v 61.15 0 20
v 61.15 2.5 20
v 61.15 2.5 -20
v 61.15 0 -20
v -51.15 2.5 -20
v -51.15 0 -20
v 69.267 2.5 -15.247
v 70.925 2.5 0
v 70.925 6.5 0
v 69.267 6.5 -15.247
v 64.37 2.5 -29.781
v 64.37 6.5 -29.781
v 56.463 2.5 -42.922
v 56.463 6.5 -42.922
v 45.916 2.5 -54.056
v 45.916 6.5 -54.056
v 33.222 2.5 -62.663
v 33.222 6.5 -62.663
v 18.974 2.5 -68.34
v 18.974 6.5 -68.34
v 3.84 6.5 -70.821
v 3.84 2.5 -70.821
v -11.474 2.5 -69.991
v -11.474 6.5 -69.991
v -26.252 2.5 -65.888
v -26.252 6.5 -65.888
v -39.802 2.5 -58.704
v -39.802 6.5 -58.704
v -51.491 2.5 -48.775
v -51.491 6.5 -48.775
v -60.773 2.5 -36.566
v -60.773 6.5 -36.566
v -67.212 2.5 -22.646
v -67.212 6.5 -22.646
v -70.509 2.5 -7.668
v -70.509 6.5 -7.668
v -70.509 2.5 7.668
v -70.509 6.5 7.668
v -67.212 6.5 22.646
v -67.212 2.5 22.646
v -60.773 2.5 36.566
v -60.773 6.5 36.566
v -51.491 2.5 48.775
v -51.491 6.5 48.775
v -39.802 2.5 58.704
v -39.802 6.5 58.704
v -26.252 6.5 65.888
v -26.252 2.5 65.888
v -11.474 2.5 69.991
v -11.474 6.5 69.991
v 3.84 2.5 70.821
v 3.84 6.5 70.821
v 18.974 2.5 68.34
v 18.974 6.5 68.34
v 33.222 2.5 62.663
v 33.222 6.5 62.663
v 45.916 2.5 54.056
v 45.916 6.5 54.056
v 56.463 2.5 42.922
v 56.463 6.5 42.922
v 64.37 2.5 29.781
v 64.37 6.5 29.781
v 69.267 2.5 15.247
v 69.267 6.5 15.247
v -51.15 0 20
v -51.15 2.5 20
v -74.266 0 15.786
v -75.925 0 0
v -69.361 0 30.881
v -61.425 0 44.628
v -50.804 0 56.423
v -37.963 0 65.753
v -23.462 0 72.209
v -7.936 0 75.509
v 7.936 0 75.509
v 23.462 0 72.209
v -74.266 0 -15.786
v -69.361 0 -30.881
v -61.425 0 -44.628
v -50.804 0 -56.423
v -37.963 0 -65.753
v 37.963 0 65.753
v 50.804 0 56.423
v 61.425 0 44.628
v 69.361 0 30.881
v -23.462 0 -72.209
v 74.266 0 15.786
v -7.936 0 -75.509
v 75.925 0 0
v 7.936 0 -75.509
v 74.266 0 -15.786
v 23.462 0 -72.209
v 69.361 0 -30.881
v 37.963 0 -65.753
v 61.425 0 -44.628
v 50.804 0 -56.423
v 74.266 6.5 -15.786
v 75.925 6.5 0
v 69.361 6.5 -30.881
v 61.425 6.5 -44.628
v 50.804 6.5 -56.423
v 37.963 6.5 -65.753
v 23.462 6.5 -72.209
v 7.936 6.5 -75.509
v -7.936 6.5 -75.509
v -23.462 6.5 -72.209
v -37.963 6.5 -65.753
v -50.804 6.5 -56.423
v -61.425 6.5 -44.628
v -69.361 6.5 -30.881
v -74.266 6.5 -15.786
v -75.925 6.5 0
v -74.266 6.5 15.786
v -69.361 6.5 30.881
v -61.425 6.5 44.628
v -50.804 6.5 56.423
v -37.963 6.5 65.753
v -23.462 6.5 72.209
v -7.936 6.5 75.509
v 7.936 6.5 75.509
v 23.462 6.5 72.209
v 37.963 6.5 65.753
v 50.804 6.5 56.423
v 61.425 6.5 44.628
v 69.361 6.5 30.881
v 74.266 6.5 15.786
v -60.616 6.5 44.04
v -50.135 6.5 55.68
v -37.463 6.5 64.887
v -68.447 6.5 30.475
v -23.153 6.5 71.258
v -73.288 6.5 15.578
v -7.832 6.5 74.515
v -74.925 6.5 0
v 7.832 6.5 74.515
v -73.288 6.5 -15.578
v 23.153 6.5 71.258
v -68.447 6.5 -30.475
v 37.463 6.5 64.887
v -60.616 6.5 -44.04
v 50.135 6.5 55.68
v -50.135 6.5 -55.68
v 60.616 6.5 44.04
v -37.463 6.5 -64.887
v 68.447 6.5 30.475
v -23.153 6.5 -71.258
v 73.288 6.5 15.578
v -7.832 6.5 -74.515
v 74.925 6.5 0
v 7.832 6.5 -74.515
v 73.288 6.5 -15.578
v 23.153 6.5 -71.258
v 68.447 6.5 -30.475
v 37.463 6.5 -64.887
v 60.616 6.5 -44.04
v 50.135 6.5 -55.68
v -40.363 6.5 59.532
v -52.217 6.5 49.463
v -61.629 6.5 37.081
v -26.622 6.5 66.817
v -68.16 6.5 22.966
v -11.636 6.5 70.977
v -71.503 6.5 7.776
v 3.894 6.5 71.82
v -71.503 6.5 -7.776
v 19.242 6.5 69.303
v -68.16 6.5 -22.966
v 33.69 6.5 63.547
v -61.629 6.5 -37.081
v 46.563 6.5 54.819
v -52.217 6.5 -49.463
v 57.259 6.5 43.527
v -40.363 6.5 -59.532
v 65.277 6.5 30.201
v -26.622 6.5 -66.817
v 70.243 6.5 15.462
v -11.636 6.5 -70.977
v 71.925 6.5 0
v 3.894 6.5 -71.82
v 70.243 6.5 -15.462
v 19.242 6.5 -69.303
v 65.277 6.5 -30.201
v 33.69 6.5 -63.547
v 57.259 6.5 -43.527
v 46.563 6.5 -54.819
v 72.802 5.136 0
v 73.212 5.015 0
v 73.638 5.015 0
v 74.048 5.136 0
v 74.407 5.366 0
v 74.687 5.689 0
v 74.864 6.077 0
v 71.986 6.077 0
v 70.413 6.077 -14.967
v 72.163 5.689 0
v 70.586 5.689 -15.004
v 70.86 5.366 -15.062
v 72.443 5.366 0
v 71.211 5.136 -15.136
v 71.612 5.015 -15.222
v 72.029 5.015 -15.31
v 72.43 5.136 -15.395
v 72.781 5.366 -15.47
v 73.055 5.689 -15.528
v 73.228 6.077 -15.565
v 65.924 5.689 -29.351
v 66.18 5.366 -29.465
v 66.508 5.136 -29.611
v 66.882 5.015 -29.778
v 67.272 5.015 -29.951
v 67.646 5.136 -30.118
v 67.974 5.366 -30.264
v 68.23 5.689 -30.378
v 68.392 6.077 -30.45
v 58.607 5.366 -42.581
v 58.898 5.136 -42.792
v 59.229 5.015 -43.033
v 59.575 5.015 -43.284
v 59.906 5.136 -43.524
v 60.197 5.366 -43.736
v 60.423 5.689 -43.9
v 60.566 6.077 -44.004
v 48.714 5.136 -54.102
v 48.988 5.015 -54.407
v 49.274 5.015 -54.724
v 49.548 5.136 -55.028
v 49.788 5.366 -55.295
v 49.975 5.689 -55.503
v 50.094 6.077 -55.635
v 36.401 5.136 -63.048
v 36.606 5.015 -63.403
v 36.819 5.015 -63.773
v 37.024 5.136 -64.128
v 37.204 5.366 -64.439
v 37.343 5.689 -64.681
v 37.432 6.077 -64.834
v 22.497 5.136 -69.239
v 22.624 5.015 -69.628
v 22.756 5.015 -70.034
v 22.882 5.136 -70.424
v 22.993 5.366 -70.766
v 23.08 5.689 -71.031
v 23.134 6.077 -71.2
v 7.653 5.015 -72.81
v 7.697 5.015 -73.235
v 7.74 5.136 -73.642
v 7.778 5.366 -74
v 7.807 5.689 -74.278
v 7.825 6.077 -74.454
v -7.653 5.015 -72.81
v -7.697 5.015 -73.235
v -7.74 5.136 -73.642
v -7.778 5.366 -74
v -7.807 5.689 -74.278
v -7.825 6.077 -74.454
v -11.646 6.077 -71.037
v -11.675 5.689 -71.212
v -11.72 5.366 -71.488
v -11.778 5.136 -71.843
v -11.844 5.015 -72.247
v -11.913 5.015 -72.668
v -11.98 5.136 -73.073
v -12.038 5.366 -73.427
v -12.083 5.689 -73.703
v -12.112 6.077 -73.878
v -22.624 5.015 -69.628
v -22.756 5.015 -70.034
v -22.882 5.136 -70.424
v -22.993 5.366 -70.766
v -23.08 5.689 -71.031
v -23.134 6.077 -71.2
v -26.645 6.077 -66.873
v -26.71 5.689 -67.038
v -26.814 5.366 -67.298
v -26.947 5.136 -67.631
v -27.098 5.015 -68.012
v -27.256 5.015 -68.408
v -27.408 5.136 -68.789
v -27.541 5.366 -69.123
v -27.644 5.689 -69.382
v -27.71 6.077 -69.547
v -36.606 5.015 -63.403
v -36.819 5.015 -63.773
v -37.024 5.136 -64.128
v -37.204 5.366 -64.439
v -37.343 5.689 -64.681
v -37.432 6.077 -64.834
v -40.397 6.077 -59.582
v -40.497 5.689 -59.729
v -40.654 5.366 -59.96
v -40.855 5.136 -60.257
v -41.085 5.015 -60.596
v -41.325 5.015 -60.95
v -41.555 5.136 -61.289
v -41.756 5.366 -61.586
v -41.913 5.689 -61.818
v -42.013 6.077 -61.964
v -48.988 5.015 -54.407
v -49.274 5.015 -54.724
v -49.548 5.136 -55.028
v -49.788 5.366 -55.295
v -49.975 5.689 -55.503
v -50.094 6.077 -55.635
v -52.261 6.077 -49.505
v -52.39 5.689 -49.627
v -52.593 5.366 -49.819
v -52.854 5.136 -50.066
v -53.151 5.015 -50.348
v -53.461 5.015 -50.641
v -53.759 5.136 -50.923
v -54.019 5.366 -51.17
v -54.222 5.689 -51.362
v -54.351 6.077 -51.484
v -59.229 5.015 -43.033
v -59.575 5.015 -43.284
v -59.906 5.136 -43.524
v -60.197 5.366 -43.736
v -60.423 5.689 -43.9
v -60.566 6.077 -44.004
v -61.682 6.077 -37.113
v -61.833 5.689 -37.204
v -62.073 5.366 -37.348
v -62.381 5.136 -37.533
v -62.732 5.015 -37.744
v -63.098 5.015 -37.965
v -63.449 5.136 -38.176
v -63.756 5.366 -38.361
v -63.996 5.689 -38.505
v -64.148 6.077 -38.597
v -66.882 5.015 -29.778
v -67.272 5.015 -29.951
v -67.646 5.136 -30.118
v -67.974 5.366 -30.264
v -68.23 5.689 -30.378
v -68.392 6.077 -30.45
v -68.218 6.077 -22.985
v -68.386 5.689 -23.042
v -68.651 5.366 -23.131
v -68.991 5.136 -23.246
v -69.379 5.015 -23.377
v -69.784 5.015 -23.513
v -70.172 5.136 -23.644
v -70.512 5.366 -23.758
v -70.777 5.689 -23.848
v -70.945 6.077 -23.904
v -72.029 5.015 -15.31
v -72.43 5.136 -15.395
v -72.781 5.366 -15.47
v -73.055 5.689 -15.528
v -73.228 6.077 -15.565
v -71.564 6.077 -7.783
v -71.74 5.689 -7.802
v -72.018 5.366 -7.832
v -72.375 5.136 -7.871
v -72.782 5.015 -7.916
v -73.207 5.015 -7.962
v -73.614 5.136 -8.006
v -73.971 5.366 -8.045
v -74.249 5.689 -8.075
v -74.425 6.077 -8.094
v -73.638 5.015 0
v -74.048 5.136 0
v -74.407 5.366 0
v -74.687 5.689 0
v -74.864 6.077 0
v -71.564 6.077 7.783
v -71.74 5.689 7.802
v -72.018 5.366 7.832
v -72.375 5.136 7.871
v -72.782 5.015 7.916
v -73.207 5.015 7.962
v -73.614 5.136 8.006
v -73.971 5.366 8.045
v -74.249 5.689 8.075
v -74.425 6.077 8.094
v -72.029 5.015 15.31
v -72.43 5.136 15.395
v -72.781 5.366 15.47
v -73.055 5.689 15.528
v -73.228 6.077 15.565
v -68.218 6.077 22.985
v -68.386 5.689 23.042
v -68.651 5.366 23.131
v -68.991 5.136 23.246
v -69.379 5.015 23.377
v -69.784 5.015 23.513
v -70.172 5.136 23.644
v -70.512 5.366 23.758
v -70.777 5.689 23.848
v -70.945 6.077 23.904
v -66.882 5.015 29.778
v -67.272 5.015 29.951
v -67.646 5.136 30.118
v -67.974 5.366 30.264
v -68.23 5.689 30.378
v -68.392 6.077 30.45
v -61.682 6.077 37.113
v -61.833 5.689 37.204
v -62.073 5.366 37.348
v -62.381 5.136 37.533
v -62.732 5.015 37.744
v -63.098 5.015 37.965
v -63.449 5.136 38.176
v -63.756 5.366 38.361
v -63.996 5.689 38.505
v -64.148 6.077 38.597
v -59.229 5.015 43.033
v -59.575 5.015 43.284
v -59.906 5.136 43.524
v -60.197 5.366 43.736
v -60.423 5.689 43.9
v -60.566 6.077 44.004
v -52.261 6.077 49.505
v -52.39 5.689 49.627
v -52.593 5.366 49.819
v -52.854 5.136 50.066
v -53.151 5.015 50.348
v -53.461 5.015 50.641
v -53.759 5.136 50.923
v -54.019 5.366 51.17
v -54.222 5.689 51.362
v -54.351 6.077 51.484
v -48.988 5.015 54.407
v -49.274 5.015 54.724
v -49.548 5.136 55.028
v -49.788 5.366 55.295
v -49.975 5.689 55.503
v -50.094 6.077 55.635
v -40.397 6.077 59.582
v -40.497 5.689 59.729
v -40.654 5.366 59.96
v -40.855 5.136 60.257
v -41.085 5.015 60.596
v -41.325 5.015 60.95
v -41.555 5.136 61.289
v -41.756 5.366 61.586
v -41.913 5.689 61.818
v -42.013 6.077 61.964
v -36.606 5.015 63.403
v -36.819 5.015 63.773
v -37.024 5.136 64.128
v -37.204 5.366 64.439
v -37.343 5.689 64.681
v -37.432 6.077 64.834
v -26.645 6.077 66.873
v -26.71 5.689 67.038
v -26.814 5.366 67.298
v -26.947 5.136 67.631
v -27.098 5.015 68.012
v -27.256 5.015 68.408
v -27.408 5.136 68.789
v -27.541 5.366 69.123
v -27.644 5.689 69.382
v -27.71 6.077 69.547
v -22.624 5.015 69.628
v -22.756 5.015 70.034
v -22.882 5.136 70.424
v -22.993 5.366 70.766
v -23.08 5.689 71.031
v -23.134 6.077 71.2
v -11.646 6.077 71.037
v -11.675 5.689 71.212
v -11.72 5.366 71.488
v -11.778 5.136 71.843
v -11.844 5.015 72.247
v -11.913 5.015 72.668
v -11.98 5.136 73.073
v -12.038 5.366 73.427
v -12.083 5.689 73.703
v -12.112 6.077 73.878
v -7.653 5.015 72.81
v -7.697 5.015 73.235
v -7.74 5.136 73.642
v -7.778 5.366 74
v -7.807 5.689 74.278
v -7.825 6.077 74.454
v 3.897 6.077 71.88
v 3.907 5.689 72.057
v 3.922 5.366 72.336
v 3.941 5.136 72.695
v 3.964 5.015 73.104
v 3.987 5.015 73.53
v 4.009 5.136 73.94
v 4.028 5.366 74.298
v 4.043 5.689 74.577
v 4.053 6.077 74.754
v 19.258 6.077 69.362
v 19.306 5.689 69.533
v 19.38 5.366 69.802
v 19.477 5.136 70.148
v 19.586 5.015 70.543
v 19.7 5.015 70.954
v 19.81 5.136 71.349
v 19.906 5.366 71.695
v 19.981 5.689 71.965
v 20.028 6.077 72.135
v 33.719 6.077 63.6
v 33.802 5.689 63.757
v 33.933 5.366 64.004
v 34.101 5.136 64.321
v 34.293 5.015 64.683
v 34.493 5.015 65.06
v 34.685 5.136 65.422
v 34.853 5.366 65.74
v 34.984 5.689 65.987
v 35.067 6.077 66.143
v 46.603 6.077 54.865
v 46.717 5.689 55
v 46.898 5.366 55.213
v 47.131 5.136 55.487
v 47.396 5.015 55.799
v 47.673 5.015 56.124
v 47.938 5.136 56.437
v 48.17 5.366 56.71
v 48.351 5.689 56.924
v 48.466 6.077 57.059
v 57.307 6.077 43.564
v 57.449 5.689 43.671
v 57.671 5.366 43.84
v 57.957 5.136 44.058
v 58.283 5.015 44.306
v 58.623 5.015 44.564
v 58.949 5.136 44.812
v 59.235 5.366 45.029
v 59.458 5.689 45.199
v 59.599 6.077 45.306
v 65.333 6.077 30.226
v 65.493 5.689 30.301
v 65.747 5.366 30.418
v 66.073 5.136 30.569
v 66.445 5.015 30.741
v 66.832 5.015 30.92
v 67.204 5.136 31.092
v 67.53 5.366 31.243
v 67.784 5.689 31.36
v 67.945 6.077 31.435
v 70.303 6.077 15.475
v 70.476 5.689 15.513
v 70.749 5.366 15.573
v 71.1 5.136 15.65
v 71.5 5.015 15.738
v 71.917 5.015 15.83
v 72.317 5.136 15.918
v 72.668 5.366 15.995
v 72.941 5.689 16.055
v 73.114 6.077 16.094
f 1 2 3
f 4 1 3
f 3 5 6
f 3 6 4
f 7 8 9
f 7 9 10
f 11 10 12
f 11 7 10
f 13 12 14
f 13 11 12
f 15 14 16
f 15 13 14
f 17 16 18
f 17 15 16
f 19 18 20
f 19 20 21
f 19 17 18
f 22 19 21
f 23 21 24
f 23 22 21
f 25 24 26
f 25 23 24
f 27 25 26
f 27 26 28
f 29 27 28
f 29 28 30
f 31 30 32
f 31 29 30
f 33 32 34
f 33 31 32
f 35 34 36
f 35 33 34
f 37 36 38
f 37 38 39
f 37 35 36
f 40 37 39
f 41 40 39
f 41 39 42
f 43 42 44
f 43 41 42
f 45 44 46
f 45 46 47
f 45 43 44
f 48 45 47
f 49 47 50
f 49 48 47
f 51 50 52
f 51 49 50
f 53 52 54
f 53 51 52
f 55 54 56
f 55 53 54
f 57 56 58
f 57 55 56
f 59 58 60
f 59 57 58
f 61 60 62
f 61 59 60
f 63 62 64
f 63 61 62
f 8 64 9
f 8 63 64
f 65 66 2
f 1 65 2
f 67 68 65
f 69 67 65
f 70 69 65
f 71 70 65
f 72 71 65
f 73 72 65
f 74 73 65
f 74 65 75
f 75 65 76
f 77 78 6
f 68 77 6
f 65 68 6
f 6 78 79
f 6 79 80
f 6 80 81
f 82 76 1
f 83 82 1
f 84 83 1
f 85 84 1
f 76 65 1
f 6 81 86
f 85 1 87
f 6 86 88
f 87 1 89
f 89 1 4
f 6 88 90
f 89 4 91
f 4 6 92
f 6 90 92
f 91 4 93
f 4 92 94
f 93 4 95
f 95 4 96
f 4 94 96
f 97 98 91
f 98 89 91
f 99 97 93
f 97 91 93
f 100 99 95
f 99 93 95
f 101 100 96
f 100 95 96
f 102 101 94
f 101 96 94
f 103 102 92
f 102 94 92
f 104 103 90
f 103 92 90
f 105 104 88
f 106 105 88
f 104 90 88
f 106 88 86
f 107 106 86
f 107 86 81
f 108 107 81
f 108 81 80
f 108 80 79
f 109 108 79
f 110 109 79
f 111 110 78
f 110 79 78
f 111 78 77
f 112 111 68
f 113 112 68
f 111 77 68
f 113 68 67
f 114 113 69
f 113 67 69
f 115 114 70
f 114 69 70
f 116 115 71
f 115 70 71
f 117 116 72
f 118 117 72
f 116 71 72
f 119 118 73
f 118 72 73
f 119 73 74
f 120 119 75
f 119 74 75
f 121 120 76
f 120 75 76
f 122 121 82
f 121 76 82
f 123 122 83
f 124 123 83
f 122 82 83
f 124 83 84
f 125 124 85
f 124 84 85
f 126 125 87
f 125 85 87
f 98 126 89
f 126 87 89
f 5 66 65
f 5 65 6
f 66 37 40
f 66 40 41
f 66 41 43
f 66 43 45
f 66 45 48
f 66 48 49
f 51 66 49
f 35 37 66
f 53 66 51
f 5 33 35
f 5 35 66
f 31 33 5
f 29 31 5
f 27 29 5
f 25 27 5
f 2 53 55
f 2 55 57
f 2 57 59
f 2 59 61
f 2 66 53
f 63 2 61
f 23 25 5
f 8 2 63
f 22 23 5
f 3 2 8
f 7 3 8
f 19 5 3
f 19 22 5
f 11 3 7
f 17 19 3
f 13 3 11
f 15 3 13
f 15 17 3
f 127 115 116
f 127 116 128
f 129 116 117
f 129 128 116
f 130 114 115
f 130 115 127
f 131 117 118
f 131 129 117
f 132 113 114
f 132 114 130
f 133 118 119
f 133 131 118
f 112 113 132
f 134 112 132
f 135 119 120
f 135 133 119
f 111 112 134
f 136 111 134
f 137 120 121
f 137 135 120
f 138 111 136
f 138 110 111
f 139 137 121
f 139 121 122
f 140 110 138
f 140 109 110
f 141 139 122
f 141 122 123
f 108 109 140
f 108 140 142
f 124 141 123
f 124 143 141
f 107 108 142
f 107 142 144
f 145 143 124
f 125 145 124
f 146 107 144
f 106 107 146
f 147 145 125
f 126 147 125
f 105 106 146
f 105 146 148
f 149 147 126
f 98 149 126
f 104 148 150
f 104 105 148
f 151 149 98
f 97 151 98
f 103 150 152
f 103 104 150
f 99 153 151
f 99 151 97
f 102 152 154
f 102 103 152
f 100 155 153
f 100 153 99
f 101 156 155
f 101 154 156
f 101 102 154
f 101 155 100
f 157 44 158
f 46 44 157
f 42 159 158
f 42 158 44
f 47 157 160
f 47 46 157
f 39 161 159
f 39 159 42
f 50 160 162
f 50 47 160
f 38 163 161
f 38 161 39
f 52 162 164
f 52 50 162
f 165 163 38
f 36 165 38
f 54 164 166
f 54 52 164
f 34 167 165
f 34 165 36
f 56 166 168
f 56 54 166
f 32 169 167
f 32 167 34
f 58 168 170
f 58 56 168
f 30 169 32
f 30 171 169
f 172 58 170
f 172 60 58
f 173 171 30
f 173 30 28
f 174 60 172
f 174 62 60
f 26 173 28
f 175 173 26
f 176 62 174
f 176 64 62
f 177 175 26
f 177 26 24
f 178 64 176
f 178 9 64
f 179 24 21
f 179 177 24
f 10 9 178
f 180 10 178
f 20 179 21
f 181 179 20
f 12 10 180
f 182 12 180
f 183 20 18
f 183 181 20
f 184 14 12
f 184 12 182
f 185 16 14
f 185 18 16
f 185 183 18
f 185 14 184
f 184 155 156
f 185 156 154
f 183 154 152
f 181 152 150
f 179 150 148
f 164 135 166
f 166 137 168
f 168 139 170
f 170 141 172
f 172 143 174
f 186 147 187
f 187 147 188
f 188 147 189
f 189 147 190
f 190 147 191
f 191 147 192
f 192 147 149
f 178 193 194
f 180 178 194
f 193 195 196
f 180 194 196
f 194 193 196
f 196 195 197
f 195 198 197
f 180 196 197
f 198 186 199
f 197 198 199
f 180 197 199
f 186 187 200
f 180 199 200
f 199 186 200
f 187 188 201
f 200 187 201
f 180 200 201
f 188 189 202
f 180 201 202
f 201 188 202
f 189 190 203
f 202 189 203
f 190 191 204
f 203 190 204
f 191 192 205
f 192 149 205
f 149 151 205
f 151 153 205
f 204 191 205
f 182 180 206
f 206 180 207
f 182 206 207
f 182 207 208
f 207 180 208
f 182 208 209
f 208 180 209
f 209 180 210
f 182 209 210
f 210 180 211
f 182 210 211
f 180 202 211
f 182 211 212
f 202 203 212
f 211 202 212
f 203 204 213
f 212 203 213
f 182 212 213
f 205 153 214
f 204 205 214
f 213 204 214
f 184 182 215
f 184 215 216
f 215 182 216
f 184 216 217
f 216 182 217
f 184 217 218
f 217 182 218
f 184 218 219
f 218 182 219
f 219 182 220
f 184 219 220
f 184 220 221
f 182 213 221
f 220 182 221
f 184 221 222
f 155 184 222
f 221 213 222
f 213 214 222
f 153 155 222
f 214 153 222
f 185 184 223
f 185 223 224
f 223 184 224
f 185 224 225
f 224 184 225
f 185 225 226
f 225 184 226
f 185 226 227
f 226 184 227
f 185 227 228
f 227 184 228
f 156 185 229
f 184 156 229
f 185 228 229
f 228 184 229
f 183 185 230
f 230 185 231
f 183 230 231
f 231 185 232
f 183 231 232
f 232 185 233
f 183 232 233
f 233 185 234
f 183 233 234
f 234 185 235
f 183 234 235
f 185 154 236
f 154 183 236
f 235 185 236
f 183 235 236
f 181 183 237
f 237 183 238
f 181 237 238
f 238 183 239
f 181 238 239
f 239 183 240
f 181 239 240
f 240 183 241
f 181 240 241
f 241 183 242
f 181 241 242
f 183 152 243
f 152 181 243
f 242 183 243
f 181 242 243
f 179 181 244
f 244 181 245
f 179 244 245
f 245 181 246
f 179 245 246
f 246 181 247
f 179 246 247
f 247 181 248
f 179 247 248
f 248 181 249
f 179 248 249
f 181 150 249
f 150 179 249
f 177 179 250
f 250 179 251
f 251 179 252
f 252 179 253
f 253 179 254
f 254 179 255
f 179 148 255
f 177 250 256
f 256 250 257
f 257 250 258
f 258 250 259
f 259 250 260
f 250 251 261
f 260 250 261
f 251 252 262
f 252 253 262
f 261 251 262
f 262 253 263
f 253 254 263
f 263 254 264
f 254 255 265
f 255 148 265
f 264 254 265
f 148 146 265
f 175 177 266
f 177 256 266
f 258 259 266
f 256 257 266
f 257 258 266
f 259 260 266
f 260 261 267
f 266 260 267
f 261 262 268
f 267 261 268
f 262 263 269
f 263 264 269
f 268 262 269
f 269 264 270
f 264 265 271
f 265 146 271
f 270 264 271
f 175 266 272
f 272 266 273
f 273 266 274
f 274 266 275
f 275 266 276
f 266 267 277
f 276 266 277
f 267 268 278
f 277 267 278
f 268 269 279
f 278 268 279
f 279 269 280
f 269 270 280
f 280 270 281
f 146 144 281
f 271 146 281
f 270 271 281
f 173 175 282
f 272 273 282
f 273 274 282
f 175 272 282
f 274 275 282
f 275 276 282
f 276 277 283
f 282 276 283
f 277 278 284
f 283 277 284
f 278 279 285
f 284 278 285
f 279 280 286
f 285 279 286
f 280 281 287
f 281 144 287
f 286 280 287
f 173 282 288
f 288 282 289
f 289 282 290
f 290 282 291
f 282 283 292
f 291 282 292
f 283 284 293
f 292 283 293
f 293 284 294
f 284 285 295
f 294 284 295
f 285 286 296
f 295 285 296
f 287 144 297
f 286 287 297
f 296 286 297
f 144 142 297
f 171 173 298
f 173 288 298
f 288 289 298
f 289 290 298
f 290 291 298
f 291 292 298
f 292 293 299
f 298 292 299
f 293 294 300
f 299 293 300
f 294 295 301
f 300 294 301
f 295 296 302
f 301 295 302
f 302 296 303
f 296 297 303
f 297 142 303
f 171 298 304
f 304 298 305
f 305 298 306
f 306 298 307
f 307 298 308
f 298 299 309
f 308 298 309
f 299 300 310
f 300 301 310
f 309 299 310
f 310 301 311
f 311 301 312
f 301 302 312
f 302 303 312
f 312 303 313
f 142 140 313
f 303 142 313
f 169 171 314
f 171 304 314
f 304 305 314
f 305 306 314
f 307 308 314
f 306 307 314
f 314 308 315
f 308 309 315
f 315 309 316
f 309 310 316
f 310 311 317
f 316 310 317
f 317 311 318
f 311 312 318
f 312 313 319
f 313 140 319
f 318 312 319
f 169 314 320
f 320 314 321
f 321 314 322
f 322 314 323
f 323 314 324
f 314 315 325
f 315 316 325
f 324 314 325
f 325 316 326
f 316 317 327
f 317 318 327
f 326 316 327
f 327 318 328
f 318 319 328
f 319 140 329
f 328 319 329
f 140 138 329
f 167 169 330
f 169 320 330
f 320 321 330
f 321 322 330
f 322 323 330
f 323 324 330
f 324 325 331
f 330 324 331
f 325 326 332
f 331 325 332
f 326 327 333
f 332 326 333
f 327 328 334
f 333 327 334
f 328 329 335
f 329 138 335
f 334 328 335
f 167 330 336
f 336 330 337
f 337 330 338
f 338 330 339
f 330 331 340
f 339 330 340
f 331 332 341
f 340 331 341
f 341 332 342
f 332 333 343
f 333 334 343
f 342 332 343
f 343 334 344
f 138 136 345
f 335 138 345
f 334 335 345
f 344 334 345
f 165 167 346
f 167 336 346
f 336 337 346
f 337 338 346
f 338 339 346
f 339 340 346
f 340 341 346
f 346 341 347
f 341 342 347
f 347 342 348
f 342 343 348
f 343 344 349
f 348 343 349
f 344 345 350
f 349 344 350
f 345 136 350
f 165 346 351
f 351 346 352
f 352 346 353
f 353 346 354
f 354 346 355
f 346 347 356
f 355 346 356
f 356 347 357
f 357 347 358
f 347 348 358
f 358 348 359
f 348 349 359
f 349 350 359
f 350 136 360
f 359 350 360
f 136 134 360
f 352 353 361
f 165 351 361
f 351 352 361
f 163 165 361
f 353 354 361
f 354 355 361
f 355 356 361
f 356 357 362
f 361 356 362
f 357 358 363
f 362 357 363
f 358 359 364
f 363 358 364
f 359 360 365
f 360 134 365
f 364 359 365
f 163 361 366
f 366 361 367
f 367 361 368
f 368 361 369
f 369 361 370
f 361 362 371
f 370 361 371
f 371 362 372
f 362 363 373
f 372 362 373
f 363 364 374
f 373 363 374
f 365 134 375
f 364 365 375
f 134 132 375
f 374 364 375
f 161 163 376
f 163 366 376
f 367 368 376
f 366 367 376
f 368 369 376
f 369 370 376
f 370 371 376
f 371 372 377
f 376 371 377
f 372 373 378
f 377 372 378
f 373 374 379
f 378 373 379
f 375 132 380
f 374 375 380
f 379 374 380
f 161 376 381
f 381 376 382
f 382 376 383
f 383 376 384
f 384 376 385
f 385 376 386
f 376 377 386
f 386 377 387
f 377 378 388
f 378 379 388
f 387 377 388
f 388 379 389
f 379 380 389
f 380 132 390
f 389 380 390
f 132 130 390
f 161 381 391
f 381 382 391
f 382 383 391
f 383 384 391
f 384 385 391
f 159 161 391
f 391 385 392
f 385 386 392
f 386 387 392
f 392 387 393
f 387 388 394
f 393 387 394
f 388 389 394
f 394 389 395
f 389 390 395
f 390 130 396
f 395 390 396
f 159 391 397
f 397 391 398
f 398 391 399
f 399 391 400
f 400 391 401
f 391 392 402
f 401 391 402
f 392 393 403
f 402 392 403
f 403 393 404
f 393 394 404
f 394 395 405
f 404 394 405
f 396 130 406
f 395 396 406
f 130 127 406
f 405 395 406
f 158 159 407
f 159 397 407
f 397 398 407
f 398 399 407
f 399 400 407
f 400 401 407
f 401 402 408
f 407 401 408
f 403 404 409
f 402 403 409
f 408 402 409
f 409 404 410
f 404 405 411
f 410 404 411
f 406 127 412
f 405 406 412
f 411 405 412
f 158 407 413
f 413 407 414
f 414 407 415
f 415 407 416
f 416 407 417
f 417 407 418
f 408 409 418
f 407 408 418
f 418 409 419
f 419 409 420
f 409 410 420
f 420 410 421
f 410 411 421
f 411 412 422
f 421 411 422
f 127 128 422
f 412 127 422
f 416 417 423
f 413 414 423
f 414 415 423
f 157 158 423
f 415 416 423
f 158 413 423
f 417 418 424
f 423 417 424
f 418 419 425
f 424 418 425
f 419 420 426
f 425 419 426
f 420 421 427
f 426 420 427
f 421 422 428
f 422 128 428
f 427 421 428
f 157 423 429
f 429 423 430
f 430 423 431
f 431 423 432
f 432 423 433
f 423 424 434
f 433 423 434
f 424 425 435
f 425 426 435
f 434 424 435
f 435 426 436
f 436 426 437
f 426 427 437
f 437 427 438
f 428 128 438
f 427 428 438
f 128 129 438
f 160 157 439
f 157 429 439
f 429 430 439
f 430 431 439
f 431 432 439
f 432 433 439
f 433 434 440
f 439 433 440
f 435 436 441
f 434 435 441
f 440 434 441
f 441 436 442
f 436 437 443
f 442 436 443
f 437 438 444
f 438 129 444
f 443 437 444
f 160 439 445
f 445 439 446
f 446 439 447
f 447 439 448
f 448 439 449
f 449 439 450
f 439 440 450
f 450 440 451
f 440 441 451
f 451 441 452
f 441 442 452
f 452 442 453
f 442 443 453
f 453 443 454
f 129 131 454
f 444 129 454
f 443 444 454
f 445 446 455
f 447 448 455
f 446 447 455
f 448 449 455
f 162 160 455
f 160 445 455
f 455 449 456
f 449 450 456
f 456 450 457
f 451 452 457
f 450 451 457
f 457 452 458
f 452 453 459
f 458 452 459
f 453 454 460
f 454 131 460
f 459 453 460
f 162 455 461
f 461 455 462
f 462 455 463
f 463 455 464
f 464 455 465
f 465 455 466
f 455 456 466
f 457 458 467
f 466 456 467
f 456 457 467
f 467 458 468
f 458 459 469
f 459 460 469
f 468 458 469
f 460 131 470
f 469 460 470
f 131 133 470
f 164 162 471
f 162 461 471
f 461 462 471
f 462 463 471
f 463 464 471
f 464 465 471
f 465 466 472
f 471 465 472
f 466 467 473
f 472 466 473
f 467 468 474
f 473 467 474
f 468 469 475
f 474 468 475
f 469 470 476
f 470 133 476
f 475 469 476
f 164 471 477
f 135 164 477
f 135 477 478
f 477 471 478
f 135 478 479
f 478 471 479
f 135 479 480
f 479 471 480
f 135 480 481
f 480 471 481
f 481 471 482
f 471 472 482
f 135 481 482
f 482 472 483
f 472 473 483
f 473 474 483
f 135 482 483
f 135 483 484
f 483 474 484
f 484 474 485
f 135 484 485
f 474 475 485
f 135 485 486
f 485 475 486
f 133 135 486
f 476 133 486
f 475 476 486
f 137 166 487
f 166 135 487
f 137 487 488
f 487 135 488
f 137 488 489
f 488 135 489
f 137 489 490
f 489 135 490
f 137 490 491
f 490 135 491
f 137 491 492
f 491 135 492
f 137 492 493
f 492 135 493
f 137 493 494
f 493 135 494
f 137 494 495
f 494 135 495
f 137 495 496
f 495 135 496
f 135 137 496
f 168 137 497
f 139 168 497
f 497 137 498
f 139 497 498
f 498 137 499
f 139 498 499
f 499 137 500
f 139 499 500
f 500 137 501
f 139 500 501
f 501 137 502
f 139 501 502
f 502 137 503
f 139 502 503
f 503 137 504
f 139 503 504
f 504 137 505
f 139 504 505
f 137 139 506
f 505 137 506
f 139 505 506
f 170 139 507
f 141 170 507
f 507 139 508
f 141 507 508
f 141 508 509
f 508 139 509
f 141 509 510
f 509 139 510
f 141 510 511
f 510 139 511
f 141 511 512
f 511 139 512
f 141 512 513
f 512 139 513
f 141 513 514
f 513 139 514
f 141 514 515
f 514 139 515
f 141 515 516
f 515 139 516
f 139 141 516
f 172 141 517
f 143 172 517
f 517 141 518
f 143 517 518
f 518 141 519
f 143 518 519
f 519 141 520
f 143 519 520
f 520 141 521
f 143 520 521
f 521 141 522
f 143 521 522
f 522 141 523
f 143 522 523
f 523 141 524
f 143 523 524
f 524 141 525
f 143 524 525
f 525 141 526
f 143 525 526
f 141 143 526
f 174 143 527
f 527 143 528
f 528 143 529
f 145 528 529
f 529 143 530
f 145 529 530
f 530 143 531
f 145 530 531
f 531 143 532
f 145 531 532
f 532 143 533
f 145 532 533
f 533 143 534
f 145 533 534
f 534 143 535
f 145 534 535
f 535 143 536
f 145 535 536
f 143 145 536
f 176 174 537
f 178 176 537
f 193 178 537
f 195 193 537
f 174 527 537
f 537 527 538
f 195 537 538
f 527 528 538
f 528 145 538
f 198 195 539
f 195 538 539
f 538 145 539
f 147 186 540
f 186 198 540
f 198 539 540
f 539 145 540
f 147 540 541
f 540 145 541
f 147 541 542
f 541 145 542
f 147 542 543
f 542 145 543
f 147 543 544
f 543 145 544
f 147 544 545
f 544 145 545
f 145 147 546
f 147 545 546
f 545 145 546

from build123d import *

# Parameters (mm, degrees)
SKETCH1_R            = 75.925
BOSS_EXTRUDE1_DEPTH  = 2.5
SKETCH2_W            = 112.3
SKETCH2_H            = 40
CUT_EXTRUDE1_DEPTH   = 3.5
SKETCH10_R           = 75.925
SKETCH10_R_2         = 70.925
BOSS_EXTRUDE2_DEPTH  = 4
CUT_SWEEP3_PROFILE_R = 1.5


with BuildPart() as part:
    # Sketch1 → Boss-Extrude1 (new body)
    with BuildSketch(Plane(origin=(0, 0, 0), x_dir=(1, 0, 0), z_dir=(0, 1, 0))):
        Circle(SKETCH1_R)
    extrude(amount=BOSS_EXTRUDE1_DEPTH)

    # Sketch2 → Cut-Extrude1 (cut, through all)
    with BuildSketch(Plane(origin=(0, 2.5, 0), x_dir=(1, 0, 0), z_dir=(0, 1, 0))):
        with Locations((5, 0)):
            Rectangle(SKETCH2_W, SKETCH2_H)
    extrude(amount=-CUT_EXTRUDE1_DEPTH, mode=Mode.SUBTRACT)

    # Sketch10 → Boss-Extrude2 (add)
    with BuildSketch(Plane(origin=(0, 2.5, 0), x_dir=(1, 0, 0), z_dir=(0, 1, 0))):
        Circle(SKETCH10_R)
        Circle(SKETCH10_R_2, mode=Mode.SUBTRACT)
    extrude(amount=BOSS_EXTRUDE2_DEPTH)

    # Cut-Sweep3: sweep along a path in Sketch12
    with BuildLine(Plane(origin=(0, 6.5, 0), x_dir=(1, 0, 0), z_dir=(0, 1, 0))) as cut_sweep3_path:
        CenterArc((0, 0), 73.425, 0, 360)
    # Cut-Sweep3 profile (on start of the path) → Cut-Sweep3 (sweep, cut)
    with BuildSketch(Plane(origin=(73.425, 6.5, 0), x_dir=(-1, 0, 0), z_dir=(0, 0, -1))):
        Circle(CUT_SWEEP3_PROFILE_R)
    sweep(path=cut_sweep3_path.line, mode=Mode.SUBTRACT)


solid = part.part
